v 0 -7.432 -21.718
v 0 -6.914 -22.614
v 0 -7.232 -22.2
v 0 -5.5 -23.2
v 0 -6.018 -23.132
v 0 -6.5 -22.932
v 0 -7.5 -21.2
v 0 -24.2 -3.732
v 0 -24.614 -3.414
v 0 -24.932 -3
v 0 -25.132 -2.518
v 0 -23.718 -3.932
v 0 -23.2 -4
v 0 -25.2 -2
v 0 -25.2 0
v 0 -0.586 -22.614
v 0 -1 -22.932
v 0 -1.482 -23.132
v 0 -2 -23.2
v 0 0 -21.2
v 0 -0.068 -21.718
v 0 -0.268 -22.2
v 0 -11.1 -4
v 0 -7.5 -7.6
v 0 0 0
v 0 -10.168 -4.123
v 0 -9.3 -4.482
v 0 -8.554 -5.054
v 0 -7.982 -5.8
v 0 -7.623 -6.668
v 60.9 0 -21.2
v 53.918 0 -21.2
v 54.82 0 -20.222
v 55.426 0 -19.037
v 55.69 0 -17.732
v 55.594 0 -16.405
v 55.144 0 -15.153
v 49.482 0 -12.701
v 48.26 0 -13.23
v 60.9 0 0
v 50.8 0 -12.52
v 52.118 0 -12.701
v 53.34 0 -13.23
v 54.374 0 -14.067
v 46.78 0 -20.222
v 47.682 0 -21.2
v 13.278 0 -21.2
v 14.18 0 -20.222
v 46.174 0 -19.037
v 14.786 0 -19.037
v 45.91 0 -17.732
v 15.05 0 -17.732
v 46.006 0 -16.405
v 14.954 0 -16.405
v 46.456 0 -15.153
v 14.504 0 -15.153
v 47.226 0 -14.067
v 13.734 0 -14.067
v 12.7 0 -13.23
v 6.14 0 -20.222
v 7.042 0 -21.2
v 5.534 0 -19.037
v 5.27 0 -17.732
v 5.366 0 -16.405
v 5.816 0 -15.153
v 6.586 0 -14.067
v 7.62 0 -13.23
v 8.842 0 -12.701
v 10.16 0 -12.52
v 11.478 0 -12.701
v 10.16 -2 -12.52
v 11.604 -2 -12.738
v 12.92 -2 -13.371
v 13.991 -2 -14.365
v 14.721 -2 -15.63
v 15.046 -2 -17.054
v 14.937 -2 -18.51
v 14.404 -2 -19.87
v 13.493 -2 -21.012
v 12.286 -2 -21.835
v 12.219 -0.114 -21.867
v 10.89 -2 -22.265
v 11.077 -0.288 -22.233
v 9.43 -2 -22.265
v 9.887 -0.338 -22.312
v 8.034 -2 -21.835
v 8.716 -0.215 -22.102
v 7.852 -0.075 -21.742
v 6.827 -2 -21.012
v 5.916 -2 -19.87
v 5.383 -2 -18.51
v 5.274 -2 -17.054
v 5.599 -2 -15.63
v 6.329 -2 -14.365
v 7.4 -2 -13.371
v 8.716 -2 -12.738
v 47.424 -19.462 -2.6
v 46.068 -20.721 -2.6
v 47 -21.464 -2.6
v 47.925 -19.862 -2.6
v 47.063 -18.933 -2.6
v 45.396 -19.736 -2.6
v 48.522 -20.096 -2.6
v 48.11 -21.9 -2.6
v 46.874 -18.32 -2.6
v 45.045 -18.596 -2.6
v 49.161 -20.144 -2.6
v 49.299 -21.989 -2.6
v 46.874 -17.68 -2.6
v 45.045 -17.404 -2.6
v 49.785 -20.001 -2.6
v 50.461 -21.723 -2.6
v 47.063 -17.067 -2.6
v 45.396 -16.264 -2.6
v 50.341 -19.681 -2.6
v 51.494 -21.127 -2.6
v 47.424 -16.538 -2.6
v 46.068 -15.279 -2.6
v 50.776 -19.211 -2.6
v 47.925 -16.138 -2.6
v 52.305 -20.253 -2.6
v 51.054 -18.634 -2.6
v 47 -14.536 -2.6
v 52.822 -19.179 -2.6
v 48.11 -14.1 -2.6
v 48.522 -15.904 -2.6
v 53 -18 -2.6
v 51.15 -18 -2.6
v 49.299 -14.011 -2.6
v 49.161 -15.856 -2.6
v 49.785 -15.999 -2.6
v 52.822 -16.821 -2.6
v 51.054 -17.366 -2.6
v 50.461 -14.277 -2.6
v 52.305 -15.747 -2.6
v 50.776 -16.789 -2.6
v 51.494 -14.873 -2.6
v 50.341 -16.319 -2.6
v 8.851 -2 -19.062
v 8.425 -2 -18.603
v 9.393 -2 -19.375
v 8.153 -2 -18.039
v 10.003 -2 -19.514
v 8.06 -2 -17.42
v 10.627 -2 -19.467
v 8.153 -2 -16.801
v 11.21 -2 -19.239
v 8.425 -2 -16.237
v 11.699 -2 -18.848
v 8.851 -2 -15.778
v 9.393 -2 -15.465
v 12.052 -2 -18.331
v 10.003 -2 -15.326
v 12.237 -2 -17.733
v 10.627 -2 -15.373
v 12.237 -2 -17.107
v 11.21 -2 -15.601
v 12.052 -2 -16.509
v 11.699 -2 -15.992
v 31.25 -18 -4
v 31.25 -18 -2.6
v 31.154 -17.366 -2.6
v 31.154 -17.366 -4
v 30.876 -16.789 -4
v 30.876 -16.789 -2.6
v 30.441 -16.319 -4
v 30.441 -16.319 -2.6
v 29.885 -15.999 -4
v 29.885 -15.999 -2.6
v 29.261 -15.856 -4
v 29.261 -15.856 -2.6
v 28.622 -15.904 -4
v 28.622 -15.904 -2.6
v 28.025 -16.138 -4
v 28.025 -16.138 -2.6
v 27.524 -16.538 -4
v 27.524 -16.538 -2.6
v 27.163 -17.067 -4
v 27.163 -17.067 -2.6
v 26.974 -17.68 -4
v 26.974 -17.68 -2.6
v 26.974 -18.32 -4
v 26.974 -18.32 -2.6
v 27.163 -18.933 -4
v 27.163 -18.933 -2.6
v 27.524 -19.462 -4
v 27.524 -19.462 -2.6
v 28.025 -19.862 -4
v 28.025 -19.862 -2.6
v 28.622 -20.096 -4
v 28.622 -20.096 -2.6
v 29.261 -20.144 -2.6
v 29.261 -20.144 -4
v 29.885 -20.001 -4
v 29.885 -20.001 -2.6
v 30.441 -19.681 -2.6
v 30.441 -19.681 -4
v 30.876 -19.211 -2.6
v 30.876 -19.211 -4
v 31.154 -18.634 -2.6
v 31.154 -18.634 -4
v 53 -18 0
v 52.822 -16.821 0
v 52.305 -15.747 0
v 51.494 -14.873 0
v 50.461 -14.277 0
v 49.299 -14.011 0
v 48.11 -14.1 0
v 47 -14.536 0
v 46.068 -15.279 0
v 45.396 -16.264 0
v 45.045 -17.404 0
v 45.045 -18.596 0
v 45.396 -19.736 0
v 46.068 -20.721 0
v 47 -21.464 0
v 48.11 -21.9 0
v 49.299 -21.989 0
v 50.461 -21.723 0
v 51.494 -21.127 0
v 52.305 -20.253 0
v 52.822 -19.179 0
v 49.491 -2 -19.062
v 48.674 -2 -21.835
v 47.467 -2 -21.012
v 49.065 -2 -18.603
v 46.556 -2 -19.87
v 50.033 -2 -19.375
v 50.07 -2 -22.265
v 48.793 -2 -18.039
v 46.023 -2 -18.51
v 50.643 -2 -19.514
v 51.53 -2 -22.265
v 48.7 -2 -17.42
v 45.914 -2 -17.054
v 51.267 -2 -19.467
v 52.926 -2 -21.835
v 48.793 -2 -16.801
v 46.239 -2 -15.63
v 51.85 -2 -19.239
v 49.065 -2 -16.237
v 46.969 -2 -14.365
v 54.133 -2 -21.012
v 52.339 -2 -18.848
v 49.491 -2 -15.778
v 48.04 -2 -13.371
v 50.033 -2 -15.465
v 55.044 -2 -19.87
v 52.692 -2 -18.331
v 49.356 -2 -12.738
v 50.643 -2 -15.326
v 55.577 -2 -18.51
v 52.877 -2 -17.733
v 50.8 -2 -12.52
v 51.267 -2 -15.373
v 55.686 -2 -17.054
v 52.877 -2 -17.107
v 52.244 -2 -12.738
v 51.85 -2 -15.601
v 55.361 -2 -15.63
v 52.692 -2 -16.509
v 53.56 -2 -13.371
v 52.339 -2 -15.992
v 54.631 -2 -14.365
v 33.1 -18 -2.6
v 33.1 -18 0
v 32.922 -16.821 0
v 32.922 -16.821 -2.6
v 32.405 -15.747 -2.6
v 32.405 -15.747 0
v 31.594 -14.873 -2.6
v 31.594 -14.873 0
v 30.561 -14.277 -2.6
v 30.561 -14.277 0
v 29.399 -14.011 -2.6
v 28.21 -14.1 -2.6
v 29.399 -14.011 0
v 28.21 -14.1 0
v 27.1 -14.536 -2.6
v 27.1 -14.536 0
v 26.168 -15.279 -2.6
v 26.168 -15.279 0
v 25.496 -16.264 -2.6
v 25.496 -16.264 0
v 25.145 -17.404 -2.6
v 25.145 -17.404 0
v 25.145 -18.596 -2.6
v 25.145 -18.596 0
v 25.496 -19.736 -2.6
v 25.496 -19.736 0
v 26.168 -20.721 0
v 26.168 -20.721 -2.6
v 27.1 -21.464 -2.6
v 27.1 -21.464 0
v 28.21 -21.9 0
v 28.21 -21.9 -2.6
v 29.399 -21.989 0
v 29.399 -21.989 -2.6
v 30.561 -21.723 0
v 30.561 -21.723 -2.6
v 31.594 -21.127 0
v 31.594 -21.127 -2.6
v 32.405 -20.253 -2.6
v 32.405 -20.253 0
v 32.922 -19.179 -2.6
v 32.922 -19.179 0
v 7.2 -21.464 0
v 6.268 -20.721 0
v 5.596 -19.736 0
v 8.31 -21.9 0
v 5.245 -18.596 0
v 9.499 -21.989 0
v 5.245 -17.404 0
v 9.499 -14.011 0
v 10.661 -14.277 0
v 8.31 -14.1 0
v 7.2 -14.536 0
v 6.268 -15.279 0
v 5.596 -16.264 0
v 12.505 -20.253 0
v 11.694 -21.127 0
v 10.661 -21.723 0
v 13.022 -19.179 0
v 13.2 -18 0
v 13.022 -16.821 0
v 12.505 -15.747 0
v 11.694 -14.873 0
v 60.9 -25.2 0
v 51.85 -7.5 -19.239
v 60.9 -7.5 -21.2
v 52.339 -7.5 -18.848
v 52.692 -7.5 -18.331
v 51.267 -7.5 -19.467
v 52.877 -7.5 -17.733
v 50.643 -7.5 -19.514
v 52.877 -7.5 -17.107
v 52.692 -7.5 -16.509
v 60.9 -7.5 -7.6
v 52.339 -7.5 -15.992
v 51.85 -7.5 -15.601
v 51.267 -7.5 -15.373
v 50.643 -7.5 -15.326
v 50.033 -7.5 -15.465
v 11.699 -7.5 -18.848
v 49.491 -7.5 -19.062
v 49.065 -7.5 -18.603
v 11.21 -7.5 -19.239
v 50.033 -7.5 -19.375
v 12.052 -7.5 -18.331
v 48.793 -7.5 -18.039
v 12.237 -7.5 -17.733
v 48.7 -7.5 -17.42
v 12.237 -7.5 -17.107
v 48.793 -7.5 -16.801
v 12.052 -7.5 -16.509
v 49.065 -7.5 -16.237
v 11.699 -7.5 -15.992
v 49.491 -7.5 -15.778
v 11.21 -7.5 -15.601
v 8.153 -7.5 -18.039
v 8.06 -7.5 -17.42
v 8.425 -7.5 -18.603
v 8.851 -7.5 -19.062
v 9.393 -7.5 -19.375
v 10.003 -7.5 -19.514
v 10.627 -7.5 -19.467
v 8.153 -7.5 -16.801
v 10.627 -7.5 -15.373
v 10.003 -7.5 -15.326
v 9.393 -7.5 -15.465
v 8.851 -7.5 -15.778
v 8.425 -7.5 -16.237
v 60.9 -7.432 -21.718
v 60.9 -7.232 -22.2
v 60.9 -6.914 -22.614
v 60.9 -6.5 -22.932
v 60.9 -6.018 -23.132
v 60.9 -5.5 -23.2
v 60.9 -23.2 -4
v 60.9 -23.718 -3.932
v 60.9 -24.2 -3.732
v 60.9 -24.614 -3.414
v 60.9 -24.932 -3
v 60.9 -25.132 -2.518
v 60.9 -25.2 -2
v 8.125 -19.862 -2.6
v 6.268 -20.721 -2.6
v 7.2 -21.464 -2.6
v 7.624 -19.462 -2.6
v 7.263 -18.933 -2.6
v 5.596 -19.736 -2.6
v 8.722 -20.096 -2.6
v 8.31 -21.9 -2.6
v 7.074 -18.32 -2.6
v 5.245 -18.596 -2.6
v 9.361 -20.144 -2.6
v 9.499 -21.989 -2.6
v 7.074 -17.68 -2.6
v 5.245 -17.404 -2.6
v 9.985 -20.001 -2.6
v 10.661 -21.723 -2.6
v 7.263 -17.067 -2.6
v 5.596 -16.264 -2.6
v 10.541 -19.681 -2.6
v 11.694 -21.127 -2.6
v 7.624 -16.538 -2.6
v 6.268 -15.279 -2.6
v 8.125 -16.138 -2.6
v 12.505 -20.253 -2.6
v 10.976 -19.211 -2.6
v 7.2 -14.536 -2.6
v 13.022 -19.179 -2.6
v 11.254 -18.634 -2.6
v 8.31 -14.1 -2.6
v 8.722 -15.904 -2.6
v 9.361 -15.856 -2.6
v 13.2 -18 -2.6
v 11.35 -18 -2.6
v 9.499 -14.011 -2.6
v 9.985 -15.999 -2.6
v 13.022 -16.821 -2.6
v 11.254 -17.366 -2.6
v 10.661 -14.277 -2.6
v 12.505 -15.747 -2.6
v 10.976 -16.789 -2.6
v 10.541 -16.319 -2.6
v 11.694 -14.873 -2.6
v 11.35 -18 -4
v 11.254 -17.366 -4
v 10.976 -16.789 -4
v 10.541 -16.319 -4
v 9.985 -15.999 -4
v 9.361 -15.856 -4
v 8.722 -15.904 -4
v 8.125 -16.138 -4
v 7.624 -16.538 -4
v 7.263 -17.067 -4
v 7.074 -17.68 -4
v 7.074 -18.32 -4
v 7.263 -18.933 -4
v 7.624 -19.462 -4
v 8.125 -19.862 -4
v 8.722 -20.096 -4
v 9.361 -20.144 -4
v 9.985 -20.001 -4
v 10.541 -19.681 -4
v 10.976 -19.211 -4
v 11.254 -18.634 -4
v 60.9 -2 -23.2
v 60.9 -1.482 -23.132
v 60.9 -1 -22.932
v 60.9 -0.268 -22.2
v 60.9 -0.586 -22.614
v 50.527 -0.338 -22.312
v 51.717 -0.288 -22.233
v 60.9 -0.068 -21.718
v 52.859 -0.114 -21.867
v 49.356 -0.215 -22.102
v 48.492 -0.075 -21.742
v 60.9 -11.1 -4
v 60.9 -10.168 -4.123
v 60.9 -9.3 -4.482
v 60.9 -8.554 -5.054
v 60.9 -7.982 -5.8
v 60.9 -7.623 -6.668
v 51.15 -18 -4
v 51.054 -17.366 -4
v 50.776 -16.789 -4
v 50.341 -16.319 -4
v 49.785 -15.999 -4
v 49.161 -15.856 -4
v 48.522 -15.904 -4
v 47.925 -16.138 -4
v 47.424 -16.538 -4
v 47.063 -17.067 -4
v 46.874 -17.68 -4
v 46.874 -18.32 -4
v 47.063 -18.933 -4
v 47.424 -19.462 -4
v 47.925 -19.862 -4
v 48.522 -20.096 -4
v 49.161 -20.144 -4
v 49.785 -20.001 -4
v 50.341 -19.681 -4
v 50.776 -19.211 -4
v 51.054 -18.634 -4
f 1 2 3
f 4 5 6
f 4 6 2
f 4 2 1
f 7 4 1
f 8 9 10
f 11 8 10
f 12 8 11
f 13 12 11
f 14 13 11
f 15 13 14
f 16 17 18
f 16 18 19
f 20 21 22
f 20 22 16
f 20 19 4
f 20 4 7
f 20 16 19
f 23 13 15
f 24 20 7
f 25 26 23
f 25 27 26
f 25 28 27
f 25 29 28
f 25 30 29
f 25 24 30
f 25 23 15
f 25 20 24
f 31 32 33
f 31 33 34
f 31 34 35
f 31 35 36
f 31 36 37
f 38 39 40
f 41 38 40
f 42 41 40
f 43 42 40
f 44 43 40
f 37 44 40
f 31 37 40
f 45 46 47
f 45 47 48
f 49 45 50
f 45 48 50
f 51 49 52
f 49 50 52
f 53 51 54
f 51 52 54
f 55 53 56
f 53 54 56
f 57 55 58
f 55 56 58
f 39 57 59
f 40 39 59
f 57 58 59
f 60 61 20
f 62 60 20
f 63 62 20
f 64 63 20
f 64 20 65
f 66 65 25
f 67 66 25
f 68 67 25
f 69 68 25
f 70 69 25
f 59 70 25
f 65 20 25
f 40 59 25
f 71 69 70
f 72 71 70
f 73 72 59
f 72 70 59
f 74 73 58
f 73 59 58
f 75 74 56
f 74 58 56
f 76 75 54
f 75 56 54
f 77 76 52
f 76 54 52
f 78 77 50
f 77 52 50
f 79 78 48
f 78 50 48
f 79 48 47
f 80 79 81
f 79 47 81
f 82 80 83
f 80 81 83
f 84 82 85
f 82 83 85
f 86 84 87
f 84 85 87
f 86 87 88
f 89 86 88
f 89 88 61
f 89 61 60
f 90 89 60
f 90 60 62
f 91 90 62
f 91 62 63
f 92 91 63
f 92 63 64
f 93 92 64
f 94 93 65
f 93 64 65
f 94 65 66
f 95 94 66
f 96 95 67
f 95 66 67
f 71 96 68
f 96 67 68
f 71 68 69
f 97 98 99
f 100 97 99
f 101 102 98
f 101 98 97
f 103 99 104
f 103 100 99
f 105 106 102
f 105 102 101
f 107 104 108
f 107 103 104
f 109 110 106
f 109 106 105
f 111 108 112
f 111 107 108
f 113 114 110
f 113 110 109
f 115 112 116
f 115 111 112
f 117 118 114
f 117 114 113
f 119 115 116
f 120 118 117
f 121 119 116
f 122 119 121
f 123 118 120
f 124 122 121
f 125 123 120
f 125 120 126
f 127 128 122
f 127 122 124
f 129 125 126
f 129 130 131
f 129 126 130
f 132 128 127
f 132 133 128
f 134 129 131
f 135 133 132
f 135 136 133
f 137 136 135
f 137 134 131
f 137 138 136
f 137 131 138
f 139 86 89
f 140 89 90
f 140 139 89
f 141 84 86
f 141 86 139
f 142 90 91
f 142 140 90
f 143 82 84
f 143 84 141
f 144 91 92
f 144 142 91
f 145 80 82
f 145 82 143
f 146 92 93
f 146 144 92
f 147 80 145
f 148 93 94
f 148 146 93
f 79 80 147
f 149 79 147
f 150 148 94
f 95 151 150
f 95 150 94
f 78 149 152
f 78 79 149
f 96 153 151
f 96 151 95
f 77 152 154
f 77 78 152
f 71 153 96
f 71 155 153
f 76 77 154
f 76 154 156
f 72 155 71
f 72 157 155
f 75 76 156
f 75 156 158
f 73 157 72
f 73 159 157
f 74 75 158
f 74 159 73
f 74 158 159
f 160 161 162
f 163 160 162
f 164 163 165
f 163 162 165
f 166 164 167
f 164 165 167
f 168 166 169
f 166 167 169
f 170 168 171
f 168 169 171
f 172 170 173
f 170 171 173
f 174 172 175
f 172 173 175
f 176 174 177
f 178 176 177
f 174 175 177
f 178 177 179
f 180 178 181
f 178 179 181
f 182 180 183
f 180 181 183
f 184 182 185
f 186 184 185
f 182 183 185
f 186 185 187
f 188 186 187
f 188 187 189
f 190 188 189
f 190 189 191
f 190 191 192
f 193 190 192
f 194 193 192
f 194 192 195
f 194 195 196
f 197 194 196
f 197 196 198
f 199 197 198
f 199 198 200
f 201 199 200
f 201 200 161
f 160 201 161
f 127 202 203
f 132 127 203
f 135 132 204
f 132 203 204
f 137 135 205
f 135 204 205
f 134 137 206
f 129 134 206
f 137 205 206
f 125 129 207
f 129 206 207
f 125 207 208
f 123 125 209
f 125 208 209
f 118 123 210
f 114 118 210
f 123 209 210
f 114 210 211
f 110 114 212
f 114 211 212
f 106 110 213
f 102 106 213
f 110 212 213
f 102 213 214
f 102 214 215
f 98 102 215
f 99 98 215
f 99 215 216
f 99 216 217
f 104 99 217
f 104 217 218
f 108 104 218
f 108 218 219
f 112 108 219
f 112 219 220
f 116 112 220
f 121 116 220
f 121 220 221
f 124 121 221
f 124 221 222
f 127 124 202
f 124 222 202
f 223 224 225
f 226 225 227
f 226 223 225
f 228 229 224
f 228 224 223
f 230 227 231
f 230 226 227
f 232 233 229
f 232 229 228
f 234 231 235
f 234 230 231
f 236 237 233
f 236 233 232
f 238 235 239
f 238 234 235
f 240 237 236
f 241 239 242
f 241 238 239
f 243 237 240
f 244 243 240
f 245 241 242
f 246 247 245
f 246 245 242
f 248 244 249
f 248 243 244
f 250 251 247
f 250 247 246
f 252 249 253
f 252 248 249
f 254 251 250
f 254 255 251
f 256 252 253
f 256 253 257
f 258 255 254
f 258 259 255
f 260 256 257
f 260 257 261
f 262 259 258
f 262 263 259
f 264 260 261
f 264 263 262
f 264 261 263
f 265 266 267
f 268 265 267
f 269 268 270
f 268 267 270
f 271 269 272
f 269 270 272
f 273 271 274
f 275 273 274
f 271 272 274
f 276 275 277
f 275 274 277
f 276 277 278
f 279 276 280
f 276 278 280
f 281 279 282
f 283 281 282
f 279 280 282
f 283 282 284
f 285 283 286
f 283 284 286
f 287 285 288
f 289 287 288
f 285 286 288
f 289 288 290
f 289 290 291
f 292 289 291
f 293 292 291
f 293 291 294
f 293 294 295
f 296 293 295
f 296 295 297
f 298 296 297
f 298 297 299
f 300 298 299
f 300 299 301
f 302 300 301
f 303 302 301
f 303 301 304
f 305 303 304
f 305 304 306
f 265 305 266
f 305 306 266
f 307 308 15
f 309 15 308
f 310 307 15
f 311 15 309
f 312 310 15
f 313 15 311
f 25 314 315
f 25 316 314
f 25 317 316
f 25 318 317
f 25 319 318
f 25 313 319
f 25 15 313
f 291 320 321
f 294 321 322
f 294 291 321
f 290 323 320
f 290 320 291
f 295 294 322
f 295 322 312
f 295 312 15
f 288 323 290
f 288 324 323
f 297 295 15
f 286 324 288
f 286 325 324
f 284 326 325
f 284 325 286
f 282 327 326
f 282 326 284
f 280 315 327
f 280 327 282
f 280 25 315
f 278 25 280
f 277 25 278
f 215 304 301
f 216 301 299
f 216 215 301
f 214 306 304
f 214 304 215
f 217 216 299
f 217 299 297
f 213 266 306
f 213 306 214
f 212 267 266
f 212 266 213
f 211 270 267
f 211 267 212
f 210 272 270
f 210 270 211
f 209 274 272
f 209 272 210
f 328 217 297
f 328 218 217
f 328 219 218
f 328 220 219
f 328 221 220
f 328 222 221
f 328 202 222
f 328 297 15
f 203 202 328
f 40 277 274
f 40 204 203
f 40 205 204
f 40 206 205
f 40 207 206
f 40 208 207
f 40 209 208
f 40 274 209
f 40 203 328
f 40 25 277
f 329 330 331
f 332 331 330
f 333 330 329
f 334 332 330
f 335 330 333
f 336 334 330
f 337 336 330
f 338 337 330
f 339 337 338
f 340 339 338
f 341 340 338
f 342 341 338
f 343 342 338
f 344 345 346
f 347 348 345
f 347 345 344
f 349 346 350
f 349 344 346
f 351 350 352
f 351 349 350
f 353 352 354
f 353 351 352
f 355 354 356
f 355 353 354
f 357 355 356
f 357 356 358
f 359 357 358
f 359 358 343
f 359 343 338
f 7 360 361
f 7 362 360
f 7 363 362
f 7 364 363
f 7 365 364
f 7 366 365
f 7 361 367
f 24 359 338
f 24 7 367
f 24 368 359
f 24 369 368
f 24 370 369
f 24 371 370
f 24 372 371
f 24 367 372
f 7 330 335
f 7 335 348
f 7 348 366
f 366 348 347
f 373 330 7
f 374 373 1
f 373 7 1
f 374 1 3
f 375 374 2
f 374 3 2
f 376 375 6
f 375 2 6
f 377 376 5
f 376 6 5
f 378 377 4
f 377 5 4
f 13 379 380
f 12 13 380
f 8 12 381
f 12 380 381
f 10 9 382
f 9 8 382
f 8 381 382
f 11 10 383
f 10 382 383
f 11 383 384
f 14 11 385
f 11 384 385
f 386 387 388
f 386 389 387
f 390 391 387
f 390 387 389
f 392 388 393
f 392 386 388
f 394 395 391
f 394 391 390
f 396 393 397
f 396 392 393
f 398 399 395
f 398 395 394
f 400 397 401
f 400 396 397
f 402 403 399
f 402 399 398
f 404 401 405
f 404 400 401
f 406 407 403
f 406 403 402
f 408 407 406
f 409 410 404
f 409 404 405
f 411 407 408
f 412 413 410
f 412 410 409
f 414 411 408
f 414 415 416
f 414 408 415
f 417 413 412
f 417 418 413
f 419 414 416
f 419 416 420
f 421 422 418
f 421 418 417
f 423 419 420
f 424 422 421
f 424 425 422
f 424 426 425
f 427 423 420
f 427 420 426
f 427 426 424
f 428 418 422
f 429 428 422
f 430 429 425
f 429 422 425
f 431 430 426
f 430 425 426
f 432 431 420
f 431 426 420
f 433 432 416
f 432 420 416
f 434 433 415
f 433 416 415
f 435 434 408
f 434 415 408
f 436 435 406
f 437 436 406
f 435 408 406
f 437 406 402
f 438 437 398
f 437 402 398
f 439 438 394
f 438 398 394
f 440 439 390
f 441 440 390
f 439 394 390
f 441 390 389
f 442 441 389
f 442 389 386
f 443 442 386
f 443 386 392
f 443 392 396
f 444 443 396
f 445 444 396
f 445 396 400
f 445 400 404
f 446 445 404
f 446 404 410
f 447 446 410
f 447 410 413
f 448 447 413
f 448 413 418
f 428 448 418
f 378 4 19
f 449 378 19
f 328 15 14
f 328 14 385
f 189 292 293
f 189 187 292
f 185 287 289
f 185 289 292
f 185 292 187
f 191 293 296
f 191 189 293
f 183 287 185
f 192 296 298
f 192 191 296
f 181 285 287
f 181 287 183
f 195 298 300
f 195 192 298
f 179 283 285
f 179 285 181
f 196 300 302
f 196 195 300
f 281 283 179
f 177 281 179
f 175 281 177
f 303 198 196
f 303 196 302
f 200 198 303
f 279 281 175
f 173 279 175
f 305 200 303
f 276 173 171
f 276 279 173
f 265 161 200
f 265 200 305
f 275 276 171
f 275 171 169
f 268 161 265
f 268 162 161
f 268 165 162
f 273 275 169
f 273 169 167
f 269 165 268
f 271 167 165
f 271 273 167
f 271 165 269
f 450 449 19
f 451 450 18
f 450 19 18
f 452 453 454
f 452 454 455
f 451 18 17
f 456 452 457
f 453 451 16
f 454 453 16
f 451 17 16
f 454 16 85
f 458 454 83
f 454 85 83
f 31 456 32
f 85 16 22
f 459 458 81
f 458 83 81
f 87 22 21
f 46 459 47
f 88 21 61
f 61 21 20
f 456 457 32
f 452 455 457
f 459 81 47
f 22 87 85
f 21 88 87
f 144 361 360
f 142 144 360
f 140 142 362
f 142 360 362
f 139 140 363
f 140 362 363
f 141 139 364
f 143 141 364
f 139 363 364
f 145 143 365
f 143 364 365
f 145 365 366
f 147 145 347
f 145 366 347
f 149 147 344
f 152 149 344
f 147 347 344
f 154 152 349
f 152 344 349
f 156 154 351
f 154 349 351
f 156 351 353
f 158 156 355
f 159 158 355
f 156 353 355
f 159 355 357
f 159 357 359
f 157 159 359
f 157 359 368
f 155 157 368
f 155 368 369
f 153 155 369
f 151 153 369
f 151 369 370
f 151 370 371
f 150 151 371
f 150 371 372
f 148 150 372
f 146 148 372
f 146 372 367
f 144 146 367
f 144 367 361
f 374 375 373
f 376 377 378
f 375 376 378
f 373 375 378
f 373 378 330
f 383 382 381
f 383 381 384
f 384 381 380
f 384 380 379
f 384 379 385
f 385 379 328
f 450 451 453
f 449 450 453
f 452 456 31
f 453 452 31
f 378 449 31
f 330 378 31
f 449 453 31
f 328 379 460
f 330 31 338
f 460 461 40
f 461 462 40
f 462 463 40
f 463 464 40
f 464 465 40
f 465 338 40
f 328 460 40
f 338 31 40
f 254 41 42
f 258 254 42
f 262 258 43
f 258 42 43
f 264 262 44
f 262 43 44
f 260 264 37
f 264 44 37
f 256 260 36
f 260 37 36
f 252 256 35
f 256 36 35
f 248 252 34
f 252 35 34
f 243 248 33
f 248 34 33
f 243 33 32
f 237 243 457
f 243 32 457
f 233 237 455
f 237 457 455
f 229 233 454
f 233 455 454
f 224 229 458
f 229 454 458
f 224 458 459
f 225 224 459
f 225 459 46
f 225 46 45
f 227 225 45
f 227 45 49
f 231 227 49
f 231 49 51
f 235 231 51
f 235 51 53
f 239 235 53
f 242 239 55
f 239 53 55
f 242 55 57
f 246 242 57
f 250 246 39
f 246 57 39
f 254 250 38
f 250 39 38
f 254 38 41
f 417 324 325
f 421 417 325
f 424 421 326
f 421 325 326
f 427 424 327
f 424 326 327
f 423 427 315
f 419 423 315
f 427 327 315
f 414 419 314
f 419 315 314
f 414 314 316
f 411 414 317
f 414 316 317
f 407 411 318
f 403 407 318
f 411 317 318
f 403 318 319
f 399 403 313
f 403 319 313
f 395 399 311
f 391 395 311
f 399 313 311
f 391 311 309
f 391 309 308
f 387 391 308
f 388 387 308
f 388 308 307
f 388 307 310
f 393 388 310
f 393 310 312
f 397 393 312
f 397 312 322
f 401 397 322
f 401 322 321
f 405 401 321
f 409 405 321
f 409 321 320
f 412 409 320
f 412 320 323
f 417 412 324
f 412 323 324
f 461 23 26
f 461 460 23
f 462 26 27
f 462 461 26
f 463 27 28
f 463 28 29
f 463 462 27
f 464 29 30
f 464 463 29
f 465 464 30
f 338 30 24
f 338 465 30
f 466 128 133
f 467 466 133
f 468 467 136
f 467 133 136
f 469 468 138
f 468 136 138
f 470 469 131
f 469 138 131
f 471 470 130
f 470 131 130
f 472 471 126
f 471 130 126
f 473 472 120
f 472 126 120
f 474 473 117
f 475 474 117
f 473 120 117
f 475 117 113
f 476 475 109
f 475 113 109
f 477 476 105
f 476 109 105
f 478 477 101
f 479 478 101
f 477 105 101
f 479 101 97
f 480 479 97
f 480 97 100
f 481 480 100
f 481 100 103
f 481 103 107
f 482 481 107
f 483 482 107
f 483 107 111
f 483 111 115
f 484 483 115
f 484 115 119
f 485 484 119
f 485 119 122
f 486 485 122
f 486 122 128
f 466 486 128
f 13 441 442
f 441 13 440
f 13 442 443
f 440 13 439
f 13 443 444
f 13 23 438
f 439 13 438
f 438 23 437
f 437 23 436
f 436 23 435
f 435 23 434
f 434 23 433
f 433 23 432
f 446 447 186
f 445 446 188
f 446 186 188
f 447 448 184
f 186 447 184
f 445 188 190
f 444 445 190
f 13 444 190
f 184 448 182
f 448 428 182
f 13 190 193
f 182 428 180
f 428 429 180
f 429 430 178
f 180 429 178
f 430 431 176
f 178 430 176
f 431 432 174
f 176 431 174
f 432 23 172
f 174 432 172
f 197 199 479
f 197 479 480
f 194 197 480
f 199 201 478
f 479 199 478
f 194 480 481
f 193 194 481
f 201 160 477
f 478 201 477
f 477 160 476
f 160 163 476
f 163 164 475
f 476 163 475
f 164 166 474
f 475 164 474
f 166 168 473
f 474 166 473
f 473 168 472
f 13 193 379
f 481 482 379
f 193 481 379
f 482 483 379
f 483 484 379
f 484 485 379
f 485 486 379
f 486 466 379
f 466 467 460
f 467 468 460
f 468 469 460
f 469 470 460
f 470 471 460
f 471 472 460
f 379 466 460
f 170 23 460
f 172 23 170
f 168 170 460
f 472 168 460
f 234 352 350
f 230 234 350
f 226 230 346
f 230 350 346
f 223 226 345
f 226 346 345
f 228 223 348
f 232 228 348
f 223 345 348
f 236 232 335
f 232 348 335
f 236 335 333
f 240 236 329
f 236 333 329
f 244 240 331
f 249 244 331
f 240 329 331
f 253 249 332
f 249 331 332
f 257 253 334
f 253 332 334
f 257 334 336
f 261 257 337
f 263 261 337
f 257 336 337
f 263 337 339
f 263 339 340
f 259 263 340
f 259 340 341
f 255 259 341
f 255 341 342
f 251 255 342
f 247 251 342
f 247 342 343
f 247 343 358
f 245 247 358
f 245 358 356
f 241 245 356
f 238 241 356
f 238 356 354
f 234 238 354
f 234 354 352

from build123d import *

# Parameters (mm, degrees)
SKETCH1_W             = 60.9
SKETCH1_H             = 25.2
BOSS_EXTRUDE1_DEPTH   = 4
SKETCH3_R             = 4
SKETCH3_R_2           = 2.15
CUT_EXTRUDE1_DEPTH    = 2.6
SKETCH3_2_R           = 2.15
CUT_EXTRUDE2_DEPTH    = 67.029160225
SKETCH4_W             = 19.2
SKETCH4_H             = 7.5
BOSS_EXTRUDE2_DEPTH   = 60.9
SKETCH5_R             = 4.9
CUT_EXTRUDE3_DEPTH    = 2
M5X0_8_TAPPED_HOLE1_D = 4.2
FILLET1_R             = 2
FILLET2_R             = 3.6


with BuildPart() as part:
    # Sketch1 → Boss-Extrude1 (new body)
    with BuildSketch(Plane.XY):
        with Locations((30.45, -12.6)):
            Rectangle(SKETCH1_W, SKETCH1_H)
    extrude(amount=-BOSS_EXTRUDE1_DEPTH)

    # Sketch3 → Cut-Extrude1 (cut)
    # profile 1 of 3: a face of its own
    with BuildSketch(Plane.XY):
        with Locations((9.2, -18)):
            Circle(SKETCH3_R)
        with Locations((9.2, -18)):
            Circle(SKETCH3_R_2, mode=Mode.SUBTRACT)
    # profile 2 of 3: a face of its own
    with BuildSketch(Plane.XY):
        with Locations((29.1, -18)):
            Circle(SKETCH3_R)
        with Locations((29.1, -18)):
            Circle(SKETCH3_R_2, mode=Mode.SUBTRACT)
    # profile 3 of 3: a face of its own
    with BuildSketch(Plane.XY):
        with Locations((49, -18)):
            Circle(SKETCH3_R)
        with Locations((49, -18)):
            Circle(SKETCH3_R_2, mode=Mode.SUBTRACT)
    extrude(amount=-CUT_EXTRUDE1_DEPTH, mode=Mode.SUBTRACT)

    # Sketch3<2> → Cut-Extrude2 (cut, through all)
    with BuildSketch(Plane.XY):
        with Locations((9.2, -18)):
            Circle(SKETCH3_2_R)
        with Locations((29.1, -18)):
            Circle(SKETCH3_2_R)
        with Locations((49, -18)):
            Circle(SKETCH3_2_R)
    extrude(amount=-CUT_EXTRUDE2_DEPTH, mode=Mode.SUBTRACT)

    # Sketch4 → Boss-Extrude2 (add)
    with BuildSketch(Plane.ZY):
        with Locations((-13.6, -3.75)):
            Rectangle(SKETCH4_W, SKETCH4_H)
    extrude(amount=-BOSS_EXTRUDE2_DEPTH)

    # Sketch5 → Cut-Extrude3 (cut)
    with BuildSketch(Plane(origin=(0, 0, 0), x_dir=(1, 0, 0), z_dir=(0, 1, 0))):
        with Locations(Location((10.16, 17.42, 0), (0, 0, 270))):
            Circle(SKETCH5_R)
        with Locations(Location((50.8, 17.42, 0), (0, 0, 270))):
            Circle(SKETCH5_R)
    extrude(amount=-CUT_EXTRUDE3_DEPTH, mode=Mode.SUBTRACT)

    # M5x0.8 Tapped Hole1 (through all)
    with Locations(Plane(origin=(0, -2, 0), x_dir=(1, 0, 0), z_dir=(0, 1, 0))):
        with Locations((10.16, 17.42), (50.8, 17.42)):
            Hole(M5X0_8_TAPPED_HOLE1_D / 2)

    # Fillet1
    # the kernel refuses this fillet: 2 mm, written as the material it takes off along each edge
    with BuildSketch(Plane(origin=(-5, 0, -23.2), x_dir=(0, 0, 1), z_dir=(1, 0, 0)), Plane(origin=(-5, -7.5, -23.2), x_dir=(0, 1, 0), z_dir=(1, 0, 0)), Plane(origin=(65.9, -25.2, -4), x_dir=(0, 0, 1), z_dir=(-1, 0, 0))) as fillet1_piece_1:
        with BuildLine():
            CenterArc((FILLET1_R, FILLET1_R), FILLET1_R, 180, 90)
            Line((0, FILLET1_R), (0, 0))
            Line((0, 0), (FILLET1_R, 0))
        make_face()
    extrude(amount=70.9, mode=Mode.SUBTRACT)

    # Fillet2
    fillet2_edges = [part.edges().sort_by_distance(p)[0] for p in [
        (30.45, -7.5, -4),
    ]]
    fillet(fillet2_edges, radius=FILLET2_R)


solid = part.part
